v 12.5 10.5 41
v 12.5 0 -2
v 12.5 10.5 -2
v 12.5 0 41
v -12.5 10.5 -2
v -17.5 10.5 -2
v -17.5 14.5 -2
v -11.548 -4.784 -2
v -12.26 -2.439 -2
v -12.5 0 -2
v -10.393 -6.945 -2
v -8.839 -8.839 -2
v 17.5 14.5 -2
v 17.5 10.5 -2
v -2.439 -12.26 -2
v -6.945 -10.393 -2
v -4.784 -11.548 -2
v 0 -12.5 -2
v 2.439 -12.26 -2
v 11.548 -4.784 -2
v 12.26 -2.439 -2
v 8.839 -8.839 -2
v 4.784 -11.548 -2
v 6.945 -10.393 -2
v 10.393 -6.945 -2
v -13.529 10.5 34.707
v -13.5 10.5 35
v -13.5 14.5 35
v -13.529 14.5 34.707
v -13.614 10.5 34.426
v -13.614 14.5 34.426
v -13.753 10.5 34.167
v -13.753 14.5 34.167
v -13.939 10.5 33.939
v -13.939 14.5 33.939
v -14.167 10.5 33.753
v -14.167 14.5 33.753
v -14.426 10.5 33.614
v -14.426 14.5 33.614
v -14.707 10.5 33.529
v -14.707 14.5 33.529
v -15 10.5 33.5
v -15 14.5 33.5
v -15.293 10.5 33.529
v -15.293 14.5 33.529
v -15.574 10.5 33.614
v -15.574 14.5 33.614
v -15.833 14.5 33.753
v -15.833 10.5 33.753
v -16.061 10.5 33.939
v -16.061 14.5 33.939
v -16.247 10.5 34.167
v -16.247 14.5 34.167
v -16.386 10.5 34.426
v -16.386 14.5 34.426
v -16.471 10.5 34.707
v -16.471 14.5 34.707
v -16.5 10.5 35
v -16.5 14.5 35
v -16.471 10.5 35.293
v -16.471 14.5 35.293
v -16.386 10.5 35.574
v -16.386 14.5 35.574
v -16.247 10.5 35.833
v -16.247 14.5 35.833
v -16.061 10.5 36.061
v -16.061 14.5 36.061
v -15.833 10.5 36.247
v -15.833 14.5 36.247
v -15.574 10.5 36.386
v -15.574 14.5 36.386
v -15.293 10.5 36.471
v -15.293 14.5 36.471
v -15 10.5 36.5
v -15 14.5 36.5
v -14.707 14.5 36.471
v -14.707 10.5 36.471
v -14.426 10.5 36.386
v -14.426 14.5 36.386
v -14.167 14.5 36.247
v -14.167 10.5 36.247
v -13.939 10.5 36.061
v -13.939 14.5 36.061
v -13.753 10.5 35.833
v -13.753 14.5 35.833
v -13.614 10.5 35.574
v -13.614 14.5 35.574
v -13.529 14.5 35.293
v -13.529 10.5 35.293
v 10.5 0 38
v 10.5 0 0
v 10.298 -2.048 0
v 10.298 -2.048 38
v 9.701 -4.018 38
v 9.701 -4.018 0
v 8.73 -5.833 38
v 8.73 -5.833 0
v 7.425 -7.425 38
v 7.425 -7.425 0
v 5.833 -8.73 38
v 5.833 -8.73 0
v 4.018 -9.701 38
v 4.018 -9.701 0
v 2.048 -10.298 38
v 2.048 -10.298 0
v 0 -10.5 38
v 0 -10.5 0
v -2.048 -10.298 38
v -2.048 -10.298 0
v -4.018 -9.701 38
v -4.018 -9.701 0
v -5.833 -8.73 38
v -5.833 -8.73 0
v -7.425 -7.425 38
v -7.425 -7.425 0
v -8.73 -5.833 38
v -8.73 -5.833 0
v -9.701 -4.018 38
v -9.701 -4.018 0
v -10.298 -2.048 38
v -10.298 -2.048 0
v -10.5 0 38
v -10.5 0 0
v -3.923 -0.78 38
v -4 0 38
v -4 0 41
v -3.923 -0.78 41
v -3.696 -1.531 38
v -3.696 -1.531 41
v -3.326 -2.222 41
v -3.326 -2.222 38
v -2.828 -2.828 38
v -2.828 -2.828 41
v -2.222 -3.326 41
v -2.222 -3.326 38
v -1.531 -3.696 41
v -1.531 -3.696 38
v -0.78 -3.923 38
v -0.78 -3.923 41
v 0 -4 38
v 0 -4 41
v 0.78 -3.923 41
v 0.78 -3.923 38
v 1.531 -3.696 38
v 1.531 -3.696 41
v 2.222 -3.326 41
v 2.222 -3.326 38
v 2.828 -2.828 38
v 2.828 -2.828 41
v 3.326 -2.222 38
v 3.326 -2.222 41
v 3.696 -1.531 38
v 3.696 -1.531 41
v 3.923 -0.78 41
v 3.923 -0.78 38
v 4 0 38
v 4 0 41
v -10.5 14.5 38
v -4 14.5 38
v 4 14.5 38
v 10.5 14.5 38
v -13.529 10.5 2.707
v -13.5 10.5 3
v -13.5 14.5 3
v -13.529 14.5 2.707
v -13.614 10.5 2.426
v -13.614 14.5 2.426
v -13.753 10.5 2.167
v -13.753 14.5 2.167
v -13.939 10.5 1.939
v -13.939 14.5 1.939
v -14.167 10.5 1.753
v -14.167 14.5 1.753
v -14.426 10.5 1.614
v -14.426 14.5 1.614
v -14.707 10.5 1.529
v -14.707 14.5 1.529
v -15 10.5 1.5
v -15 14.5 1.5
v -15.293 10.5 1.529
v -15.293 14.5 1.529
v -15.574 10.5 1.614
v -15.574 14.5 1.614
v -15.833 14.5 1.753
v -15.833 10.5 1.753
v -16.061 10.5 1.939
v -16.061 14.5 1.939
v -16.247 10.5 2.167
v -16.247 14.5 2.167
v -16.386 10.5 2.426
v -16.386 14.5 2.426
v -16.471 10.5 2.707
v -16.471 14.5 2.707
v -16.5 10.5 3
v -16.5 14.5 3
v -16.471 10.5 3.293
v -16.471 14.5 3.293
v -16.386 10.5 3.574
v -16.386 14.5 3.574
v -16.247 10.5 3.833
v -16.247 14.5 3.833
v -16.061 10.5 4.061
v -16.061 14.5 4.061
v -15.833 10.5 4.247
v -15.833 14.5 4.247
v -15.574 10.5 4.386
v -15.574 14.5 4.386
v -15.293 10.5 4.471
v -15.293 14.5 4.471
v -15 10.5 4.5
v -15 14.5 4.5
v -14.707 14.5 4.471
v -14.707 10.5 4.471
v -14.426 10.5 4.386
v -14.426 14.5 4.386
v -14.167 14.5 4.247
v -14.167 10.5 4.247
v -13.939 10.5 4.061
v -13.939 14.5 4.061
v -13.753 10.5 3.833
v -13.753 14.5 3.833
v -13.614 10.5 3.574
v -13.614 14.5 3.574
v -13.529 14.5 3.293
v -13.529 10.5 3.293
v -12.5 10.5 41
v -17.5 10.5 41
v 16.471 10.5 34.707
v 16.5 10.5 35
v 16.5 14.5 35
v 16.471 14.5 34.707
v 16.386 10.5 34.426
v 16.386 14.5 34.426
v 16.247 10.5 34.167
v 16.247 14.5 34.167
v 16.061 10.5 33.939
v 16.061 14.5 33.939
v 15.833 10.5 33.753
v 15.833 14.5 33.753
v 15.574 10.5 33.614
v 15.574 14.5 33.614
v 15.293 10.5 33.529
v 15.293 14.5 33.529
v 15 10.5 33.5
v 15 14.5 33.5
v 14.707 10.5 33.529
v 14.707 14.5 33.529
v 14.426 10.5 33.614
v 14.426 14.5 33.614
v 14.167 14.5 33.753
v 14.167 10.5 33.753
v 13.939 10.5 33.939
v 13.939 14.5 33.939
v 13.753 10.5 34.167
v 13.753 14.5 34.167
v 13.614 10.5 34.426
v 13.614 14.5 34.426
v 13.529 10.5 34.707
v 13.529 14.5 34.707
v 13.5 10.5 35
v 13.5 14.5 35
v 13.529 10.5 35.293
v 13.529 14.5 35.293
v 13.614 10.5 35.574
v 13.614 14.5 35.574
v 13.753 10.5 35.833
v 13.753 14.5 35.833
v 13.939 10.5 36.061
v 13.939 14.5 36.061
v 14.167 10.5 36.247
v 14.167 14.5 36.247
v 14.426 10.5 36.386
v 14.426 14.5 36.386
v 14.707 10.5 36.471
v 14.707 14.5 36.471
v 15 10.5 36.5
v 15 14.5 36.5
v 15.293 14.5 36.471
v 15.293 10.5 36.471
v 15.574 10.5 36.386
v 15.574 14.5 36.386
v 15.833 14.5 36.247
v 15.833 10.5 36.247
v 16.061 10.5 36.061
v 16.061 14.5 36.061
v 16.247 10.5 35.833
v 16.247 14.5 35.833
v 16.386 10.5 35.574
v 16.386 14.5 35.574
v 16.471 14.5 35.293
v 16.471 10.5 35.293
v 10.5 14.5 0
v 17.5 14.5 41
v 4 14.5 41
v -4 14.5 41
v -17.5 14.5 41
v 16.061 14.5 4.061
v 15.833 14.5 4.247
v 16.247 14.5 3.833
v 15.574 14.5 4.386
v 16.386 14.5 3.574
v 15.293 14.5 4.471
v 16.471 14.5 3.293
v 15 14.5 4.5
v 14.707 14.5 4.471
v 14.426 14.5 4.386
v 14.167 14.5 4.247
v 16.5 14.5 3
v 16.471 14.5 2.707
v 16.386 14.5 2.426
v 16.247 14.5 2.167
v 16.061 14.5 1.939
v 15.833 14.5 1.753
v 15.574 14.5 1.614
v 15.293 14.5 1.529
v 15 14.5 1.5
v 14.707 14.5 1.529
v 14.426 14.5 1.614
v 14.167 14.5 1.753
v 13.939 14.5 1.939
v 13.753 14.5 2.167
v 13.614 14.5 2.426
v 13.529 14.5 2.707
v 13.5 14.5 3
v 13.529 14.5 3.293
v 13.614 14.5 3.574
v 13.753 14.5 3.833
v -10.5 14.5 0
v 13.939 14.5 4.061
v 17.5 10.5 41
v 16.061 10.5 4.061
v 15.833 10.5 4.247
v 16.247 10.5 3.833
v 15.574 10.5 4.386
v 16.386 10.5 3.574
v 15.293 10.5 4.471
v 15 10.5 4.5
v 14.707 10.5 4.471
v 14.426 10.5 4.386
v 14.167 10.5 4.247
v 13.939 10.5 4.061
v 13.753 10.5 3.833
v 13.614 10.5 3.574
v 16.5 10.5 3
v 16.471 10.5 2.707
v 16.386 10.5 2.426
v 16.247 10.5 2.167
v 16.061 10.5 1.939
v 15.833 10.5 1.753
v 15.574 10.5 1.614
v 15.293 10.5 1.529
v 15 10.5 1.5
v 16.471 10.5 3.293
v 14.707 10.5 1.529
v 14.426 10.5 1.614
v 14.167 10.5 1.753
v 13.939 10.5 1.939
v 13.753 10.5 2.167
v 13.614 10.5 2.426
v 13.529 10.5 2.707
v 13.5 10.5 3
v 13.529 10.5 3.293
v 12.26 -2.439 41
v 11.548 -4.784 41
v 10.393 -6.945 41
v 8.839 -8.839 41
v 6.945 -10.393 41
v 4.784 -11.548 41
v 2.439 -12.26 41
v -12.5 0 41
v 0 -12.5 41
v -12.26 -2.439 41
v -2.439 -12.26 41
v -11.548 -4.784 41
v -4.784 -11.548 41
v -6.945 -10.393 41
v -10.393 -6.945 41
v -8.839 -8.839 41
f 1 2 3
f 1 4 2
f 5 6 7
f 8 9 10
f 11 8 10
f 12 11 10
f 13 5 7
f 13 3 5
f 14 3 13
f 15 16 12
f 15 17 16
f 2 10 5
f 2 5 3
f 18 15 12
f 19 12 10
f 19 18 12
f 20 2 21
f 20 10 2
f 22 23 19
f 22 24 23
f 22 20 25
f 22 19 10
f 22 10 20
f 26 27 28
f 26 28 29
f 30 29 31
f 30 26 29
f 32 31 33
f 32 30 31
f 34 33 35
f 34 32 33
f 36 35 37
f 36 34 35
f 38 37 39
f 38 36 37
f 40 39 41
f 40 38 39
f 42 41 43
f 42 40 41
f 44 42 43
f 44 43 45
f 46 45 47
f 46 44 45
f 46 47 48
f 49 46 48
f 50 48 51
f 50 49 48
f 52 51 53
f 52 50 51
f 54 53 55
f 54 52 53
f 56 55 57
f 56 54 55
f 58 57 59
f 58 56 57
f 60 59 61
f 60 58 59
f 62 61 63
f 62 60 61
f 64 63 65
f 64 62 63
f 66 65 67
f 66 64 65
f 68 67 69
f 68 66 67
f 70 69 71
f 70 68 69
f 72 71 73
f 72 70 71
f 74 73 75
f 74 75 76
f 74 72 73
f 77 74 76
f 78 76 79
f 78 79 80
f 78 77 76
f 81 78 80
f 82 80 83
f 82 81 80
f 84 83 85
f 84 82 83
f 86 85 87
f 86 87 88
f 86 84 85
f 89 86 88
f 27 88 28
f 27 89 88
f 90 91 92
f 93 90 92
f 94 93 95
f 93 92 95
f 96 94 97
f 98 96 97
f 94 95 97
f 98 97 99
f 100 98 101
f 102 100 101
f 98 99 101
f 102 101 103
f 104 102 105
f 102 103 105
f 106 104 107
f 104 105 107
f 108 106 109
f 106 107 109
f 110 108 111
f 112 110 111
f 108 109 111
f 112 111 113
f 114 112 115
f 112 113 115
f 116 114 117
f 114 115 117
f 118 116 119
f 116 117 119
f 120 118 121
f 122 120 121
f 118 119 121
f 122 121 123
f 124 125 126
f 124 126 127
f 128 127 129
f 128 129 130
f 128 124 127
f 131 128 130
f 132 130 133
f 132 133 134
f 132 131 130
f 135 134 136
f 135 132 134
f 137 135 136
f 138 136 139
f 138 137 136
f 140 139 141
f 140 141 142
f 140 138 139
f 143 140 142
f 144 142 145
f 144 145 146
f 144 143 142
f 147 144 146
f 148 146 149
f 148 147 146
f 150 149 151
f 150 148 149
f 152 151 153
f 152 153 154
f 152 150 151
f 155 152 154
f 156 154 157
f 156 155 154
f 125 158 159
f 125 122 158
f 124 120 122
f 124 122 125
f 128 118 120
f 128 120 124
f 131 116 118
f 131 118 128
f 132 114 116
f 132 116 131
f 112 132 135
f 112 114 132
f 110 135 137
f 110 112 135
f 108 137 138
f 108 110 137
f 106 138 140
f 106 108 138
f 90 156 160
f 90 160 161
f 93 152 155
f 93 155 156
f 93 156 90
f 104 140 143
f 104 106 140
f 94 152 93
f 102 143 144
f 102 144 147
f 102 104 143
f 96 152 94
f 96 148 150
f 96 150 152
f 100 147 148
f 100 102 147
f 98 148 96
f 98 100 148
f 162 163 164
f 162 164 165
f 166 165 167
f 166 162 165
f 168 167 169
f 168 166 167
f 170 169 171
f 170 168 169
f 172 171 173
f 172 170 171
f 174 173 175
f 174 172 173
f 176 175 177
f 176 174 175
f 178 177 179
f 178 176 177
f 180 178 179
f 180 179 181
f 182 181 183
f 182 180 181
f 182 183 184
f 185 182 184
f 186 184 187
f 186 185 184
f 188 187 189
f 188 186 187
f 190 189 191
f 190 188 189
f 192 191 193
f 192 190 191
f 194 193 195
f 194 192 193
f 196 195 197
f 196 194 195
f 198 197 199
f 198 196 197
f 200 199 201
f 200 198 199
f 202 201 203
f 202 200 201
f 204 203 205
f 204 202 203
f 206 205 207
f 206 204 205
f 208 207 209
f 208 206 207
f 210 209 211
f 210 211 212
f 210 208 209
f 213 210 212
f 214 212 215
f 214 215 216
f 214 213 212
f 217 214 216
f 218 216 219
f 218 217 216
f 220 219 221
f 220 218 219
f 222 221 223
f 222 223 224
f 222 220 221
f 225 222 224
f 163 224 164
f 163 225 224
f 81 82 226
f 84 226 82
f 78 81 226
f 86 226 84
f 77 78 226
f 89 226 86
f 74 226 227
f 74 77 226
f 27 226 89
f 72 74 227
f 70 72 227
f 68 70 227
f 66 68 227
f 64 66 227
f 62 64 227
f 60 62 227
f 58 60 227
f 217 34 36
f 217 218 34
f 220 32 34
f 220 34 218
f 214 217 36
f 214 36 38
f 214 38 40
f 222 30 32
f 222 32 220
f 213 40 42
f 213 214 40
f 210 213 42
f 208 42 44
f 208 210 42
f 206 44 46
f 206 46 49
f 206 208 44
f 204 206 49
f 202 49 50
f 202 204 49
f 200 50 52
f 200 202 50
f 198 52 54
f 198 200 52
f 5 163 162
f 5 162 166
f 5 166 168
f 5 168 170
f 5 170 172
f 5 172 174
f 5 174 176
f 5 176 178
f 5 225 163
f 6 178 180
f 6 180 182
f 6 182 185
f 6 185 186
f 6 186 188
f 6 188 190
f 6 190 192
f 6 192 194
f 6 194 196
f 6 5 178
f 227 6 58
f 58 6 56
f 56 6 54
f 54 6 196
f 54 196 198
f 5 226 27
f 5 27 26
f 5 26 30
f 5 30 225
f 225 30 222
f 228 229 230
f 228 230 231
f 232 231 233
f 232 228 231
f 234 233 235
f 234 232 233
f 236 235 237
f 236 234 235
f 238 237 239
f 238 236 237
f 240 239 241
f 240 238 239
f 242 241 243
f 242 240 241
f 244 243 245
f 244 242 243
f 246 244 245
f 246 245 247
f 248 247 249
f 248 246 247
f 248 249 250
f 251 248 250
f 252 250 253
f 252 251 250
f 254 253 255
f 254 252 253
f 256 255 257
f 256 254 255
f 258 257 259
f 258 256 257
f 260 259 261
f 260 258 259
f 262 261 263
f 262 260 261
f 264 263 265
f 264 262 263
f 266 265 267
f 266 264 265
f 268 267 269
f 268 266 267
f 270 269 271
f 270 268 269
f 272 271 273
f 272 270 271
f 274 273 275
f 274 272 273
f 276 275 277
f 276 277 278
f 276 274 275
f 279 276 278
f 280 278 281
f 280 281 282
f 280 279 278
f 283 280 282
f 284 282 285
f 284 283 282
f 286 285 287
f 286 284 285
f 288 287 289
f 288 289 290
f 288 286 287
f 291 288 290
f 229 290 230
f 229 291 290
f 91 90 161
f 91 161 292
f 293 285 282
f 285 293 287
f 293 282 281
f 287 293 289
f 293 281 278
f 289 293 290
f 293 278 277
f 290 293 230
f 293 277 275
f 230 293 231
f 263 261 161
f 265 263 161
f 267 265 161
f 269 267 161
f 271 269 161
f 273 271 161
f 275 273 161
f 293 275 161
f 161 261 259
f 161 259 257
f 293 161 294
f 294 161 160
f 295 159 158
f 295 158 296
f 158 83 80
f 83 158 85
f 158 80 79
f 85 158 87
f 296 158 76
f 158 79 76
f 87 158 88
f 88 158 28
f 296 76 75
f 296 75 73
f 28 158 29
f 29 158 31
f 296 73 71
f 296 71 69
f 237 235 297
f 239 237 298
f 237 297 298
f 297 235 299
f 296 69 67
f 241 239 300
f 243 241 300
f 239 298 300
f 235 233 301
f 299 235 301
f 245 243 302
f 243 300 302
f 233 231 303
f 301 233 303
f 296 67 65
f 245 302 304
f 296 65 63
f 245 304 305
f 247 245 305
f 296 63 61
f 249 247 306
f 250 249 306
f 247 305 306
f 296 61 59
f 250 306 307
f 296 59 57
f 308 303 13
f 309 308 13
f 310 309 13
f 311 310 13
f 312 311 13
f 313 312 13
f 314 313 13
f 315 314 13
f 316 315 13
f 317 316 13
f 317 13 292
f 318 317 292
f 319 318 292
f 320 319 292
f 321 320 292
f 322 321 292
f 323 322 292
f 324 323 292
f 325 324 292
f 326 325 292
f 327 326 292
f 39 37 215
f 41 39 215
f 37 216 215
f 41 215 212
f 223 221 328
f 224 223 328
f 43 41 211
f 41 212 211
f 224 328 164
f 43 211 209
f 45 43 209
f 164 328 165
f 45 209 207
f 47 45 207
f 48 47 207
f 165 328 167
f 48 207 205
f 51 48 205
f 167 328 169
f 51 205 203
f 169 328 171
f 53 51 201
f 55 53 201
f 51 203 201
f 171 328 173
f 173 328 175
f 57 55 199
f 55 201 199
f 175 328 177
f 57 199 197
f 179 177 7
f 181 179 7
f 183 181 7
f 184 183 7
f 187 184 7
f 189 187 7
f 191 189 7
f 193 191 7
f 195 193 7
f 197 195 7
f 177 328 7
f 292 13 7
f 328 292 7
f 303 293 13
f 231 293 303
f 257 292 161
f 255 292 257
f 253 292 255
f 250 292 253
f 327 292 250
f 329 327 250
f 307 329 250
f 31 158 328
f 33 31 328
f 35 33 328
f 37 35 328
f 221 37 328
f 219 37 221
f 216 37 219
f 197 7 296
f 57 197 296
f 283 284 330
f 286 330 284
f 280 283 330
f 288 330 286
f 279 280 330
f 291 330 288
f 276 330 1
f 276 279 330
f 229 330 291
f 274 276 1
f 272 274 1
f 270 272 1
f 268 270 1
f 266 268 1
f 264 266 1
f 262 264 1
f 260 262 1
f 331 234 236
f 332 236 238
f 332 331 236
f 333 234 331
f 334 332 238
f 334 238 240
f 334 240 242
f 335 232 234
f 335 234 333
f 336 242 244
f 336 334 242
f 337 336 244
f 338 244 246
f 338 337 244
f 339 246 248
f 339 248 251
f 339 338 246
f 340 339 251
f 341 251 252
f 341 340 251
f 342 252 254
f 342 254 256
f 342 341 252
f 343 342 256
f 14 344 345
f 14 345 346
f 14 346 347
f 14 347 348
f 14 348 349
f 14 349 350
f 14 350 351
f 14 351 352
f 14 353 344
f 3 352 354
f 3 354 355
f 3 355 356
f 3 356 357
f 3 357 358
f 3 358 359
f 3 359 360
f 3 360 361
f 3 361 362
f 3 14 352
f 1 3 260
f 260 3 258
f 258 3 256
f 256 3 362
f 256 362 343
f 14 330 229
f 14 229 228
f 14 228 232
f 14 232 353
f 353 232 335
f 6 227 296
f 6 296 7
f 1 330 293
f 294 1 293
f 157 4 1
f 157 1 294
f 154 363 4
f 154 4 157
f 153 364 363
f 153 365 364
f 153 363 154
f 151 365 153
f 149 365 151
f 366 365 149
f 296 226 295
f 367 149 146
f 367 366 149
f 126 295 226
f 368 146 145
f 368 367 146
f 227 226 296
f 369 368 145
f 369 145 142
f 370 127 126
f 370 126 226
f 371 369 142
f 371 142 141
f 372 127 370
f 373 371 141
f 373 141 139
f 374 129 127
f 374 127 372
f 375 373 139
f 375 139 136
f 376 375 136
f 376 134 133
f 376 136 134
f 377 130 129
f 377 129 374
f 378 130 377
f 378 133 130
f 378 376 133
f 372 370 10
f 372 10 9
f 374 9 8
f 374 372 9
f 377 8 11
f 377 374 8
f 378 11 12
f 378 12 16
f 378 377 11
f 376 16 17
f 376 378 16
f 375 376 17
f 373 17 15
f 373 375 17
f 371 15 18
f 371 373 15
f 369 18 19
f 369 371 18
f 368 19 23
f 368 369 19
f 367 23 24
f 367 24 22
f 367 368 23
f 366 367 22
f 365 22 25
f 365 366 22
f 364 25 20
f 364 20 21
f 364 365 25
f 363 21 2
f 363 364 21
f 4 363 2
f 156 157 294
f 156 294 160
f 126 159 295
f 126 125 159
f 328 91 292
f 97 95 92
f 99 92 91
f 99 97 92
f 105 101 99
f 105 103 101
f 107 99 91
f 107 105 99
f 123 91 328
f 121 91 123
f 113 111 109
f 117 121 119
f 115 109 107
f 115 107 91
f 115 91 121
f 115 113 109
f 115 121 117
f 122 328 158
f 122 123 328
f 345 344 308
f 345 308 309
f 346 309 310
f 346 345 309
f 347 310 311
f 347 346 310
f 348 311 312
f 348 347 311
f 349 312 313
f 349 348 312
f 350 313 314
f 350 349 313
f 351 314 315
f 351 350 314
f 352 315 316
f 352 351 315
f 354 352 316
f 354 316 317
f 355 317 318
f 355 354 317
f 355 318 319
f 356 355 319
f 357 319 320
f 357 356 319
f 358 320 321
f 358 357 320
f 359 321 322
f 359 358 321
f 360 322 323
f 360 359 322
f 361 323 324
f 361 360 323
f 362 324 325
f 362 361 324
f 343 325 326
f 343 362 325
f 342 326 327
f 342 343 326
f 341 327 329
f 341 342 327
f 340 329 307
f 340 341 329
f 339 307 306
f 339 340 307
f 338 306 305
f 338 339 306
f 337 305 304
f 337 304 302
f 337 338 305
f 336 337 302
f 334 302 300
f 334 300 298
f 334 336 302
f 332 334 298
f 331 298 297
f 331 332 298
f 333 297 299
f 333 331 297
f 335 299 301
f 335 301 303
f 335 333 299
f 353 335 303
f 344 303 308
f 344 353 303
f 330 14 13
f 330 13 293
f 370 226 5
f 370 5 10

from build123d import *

# Parameters (mm, degrees)
SALIENTE_EXTRUIR1_DEPTH = 38
SALIENTE_EXTRUIR2_DEPTH = 3
SALIENTE_EXTRUIR3_DEPTH = 2
CROQUIS4_R              = 1.5
SALIENTE_EXTRUIR4_DEPTH = 4


with BuildPart() as part:
    # Croquis1 → Saliente-Extruir1 (new body)
    with BuildSketch(Plane.XY):
        with BuildLine():
            Line((-10.5, 0), (-10.5, 10.5))
            Line((-10.5, 10.5), (-12.5, 10.5))
            Line((-12.5, 10.5), (-12.5, 0))
            ThreePointArc((-12.5, 0), (0, -12.5), (12.5, 0))
            Line((12.5, 0), (12.5, 10.5))
            Line((12.5, 10.5), (10.5, 10.5))
            Line((10.5, 10.5), (10.5, 0))
            ThreePointArc((10.5, 0), (0, -10.5), (-10.5, 0))
        make_face()
    extrude(amount=SALIENTE_EXTRUIR1_DEPTH)

    # Croquis2 → Saliente-Extruir2 (add)
    with BuildSketch(Plane.XY.offset(38)):
        with BuildLine():
            Line((-12.5, 10.5), (-4, 10.5))
            Line((-4, 10.5), (-4, 0))
            ThreePointArc((-4, 0), (0, -4), (4, 0))
            Line((4, 0), (4, 10.5))
            Line((4, 10.5), (12.5, 10.5))
            Line((12.5, 10.5), (12.5, 0))
            ThreePointArc((12.5, 0), (0, -12.5), (-12.5, 0))
            Line((-12.5, 0), (-12.5, 10.5))
        make_face()
    extrude(amount=SALIENTE_EXTRUIR2_DEPTH)

    # Croquis3 → Saliente-Extruir3 (add)
    with BuildSketch(Plane(origin=(0, 0, 0), x_dir=(-1, 0, 0), z_dir=(0, 0, -1))):
        with BuildLine():
            Line((-12.5, 10.5), (12.5, 10.5))
            Line((12.5, 10.5), (12.5, 0))
            ThreePointArc((12.5, 0), (0, -12.5), (-12.5, 0))
            Line((-12.5, 0), (-12.5, 10.5))
        make_face()
    extrude(amount=SALIENTE_EXTRUIR3_DEPTH)

    # Croquis4 → Saliente-Extruir4 (add)
    with BuildSketch(Plane(origin=(0, 10.5, 0), x_dir=(1, 0, 0), z_dir=(0, 1, 0))):
        Polygon((-17.5, 2), (17.5, 2), (17.5, -41), (4, -41), (4, -38), (10.5, -38), (10.5, 0), (-10.5, 0), (-10.5, -38), (-4, -38), (-4, -41), (-17.5, -41), align=None)
        with Locations((-15, -3)):
            Circle(CROQUIS4_R, mode=Mode.SUBTRACT)
        with Locations((15, -3)):
            Circle(CROQUIS4_R, mode=Mode.SUBTRACT)
        with Locations((15, -35)):
            Circle(CROQUIS4_R, mode=Mode.SUBTRACT)
        with Locations((-15, -35)):
            Circle(CROQUIS4_R, mode=Mode.SUBTRACT)
    extrude(amount=SALIENTE_EXTRUIR4_DEPTH)


solid = part.part
